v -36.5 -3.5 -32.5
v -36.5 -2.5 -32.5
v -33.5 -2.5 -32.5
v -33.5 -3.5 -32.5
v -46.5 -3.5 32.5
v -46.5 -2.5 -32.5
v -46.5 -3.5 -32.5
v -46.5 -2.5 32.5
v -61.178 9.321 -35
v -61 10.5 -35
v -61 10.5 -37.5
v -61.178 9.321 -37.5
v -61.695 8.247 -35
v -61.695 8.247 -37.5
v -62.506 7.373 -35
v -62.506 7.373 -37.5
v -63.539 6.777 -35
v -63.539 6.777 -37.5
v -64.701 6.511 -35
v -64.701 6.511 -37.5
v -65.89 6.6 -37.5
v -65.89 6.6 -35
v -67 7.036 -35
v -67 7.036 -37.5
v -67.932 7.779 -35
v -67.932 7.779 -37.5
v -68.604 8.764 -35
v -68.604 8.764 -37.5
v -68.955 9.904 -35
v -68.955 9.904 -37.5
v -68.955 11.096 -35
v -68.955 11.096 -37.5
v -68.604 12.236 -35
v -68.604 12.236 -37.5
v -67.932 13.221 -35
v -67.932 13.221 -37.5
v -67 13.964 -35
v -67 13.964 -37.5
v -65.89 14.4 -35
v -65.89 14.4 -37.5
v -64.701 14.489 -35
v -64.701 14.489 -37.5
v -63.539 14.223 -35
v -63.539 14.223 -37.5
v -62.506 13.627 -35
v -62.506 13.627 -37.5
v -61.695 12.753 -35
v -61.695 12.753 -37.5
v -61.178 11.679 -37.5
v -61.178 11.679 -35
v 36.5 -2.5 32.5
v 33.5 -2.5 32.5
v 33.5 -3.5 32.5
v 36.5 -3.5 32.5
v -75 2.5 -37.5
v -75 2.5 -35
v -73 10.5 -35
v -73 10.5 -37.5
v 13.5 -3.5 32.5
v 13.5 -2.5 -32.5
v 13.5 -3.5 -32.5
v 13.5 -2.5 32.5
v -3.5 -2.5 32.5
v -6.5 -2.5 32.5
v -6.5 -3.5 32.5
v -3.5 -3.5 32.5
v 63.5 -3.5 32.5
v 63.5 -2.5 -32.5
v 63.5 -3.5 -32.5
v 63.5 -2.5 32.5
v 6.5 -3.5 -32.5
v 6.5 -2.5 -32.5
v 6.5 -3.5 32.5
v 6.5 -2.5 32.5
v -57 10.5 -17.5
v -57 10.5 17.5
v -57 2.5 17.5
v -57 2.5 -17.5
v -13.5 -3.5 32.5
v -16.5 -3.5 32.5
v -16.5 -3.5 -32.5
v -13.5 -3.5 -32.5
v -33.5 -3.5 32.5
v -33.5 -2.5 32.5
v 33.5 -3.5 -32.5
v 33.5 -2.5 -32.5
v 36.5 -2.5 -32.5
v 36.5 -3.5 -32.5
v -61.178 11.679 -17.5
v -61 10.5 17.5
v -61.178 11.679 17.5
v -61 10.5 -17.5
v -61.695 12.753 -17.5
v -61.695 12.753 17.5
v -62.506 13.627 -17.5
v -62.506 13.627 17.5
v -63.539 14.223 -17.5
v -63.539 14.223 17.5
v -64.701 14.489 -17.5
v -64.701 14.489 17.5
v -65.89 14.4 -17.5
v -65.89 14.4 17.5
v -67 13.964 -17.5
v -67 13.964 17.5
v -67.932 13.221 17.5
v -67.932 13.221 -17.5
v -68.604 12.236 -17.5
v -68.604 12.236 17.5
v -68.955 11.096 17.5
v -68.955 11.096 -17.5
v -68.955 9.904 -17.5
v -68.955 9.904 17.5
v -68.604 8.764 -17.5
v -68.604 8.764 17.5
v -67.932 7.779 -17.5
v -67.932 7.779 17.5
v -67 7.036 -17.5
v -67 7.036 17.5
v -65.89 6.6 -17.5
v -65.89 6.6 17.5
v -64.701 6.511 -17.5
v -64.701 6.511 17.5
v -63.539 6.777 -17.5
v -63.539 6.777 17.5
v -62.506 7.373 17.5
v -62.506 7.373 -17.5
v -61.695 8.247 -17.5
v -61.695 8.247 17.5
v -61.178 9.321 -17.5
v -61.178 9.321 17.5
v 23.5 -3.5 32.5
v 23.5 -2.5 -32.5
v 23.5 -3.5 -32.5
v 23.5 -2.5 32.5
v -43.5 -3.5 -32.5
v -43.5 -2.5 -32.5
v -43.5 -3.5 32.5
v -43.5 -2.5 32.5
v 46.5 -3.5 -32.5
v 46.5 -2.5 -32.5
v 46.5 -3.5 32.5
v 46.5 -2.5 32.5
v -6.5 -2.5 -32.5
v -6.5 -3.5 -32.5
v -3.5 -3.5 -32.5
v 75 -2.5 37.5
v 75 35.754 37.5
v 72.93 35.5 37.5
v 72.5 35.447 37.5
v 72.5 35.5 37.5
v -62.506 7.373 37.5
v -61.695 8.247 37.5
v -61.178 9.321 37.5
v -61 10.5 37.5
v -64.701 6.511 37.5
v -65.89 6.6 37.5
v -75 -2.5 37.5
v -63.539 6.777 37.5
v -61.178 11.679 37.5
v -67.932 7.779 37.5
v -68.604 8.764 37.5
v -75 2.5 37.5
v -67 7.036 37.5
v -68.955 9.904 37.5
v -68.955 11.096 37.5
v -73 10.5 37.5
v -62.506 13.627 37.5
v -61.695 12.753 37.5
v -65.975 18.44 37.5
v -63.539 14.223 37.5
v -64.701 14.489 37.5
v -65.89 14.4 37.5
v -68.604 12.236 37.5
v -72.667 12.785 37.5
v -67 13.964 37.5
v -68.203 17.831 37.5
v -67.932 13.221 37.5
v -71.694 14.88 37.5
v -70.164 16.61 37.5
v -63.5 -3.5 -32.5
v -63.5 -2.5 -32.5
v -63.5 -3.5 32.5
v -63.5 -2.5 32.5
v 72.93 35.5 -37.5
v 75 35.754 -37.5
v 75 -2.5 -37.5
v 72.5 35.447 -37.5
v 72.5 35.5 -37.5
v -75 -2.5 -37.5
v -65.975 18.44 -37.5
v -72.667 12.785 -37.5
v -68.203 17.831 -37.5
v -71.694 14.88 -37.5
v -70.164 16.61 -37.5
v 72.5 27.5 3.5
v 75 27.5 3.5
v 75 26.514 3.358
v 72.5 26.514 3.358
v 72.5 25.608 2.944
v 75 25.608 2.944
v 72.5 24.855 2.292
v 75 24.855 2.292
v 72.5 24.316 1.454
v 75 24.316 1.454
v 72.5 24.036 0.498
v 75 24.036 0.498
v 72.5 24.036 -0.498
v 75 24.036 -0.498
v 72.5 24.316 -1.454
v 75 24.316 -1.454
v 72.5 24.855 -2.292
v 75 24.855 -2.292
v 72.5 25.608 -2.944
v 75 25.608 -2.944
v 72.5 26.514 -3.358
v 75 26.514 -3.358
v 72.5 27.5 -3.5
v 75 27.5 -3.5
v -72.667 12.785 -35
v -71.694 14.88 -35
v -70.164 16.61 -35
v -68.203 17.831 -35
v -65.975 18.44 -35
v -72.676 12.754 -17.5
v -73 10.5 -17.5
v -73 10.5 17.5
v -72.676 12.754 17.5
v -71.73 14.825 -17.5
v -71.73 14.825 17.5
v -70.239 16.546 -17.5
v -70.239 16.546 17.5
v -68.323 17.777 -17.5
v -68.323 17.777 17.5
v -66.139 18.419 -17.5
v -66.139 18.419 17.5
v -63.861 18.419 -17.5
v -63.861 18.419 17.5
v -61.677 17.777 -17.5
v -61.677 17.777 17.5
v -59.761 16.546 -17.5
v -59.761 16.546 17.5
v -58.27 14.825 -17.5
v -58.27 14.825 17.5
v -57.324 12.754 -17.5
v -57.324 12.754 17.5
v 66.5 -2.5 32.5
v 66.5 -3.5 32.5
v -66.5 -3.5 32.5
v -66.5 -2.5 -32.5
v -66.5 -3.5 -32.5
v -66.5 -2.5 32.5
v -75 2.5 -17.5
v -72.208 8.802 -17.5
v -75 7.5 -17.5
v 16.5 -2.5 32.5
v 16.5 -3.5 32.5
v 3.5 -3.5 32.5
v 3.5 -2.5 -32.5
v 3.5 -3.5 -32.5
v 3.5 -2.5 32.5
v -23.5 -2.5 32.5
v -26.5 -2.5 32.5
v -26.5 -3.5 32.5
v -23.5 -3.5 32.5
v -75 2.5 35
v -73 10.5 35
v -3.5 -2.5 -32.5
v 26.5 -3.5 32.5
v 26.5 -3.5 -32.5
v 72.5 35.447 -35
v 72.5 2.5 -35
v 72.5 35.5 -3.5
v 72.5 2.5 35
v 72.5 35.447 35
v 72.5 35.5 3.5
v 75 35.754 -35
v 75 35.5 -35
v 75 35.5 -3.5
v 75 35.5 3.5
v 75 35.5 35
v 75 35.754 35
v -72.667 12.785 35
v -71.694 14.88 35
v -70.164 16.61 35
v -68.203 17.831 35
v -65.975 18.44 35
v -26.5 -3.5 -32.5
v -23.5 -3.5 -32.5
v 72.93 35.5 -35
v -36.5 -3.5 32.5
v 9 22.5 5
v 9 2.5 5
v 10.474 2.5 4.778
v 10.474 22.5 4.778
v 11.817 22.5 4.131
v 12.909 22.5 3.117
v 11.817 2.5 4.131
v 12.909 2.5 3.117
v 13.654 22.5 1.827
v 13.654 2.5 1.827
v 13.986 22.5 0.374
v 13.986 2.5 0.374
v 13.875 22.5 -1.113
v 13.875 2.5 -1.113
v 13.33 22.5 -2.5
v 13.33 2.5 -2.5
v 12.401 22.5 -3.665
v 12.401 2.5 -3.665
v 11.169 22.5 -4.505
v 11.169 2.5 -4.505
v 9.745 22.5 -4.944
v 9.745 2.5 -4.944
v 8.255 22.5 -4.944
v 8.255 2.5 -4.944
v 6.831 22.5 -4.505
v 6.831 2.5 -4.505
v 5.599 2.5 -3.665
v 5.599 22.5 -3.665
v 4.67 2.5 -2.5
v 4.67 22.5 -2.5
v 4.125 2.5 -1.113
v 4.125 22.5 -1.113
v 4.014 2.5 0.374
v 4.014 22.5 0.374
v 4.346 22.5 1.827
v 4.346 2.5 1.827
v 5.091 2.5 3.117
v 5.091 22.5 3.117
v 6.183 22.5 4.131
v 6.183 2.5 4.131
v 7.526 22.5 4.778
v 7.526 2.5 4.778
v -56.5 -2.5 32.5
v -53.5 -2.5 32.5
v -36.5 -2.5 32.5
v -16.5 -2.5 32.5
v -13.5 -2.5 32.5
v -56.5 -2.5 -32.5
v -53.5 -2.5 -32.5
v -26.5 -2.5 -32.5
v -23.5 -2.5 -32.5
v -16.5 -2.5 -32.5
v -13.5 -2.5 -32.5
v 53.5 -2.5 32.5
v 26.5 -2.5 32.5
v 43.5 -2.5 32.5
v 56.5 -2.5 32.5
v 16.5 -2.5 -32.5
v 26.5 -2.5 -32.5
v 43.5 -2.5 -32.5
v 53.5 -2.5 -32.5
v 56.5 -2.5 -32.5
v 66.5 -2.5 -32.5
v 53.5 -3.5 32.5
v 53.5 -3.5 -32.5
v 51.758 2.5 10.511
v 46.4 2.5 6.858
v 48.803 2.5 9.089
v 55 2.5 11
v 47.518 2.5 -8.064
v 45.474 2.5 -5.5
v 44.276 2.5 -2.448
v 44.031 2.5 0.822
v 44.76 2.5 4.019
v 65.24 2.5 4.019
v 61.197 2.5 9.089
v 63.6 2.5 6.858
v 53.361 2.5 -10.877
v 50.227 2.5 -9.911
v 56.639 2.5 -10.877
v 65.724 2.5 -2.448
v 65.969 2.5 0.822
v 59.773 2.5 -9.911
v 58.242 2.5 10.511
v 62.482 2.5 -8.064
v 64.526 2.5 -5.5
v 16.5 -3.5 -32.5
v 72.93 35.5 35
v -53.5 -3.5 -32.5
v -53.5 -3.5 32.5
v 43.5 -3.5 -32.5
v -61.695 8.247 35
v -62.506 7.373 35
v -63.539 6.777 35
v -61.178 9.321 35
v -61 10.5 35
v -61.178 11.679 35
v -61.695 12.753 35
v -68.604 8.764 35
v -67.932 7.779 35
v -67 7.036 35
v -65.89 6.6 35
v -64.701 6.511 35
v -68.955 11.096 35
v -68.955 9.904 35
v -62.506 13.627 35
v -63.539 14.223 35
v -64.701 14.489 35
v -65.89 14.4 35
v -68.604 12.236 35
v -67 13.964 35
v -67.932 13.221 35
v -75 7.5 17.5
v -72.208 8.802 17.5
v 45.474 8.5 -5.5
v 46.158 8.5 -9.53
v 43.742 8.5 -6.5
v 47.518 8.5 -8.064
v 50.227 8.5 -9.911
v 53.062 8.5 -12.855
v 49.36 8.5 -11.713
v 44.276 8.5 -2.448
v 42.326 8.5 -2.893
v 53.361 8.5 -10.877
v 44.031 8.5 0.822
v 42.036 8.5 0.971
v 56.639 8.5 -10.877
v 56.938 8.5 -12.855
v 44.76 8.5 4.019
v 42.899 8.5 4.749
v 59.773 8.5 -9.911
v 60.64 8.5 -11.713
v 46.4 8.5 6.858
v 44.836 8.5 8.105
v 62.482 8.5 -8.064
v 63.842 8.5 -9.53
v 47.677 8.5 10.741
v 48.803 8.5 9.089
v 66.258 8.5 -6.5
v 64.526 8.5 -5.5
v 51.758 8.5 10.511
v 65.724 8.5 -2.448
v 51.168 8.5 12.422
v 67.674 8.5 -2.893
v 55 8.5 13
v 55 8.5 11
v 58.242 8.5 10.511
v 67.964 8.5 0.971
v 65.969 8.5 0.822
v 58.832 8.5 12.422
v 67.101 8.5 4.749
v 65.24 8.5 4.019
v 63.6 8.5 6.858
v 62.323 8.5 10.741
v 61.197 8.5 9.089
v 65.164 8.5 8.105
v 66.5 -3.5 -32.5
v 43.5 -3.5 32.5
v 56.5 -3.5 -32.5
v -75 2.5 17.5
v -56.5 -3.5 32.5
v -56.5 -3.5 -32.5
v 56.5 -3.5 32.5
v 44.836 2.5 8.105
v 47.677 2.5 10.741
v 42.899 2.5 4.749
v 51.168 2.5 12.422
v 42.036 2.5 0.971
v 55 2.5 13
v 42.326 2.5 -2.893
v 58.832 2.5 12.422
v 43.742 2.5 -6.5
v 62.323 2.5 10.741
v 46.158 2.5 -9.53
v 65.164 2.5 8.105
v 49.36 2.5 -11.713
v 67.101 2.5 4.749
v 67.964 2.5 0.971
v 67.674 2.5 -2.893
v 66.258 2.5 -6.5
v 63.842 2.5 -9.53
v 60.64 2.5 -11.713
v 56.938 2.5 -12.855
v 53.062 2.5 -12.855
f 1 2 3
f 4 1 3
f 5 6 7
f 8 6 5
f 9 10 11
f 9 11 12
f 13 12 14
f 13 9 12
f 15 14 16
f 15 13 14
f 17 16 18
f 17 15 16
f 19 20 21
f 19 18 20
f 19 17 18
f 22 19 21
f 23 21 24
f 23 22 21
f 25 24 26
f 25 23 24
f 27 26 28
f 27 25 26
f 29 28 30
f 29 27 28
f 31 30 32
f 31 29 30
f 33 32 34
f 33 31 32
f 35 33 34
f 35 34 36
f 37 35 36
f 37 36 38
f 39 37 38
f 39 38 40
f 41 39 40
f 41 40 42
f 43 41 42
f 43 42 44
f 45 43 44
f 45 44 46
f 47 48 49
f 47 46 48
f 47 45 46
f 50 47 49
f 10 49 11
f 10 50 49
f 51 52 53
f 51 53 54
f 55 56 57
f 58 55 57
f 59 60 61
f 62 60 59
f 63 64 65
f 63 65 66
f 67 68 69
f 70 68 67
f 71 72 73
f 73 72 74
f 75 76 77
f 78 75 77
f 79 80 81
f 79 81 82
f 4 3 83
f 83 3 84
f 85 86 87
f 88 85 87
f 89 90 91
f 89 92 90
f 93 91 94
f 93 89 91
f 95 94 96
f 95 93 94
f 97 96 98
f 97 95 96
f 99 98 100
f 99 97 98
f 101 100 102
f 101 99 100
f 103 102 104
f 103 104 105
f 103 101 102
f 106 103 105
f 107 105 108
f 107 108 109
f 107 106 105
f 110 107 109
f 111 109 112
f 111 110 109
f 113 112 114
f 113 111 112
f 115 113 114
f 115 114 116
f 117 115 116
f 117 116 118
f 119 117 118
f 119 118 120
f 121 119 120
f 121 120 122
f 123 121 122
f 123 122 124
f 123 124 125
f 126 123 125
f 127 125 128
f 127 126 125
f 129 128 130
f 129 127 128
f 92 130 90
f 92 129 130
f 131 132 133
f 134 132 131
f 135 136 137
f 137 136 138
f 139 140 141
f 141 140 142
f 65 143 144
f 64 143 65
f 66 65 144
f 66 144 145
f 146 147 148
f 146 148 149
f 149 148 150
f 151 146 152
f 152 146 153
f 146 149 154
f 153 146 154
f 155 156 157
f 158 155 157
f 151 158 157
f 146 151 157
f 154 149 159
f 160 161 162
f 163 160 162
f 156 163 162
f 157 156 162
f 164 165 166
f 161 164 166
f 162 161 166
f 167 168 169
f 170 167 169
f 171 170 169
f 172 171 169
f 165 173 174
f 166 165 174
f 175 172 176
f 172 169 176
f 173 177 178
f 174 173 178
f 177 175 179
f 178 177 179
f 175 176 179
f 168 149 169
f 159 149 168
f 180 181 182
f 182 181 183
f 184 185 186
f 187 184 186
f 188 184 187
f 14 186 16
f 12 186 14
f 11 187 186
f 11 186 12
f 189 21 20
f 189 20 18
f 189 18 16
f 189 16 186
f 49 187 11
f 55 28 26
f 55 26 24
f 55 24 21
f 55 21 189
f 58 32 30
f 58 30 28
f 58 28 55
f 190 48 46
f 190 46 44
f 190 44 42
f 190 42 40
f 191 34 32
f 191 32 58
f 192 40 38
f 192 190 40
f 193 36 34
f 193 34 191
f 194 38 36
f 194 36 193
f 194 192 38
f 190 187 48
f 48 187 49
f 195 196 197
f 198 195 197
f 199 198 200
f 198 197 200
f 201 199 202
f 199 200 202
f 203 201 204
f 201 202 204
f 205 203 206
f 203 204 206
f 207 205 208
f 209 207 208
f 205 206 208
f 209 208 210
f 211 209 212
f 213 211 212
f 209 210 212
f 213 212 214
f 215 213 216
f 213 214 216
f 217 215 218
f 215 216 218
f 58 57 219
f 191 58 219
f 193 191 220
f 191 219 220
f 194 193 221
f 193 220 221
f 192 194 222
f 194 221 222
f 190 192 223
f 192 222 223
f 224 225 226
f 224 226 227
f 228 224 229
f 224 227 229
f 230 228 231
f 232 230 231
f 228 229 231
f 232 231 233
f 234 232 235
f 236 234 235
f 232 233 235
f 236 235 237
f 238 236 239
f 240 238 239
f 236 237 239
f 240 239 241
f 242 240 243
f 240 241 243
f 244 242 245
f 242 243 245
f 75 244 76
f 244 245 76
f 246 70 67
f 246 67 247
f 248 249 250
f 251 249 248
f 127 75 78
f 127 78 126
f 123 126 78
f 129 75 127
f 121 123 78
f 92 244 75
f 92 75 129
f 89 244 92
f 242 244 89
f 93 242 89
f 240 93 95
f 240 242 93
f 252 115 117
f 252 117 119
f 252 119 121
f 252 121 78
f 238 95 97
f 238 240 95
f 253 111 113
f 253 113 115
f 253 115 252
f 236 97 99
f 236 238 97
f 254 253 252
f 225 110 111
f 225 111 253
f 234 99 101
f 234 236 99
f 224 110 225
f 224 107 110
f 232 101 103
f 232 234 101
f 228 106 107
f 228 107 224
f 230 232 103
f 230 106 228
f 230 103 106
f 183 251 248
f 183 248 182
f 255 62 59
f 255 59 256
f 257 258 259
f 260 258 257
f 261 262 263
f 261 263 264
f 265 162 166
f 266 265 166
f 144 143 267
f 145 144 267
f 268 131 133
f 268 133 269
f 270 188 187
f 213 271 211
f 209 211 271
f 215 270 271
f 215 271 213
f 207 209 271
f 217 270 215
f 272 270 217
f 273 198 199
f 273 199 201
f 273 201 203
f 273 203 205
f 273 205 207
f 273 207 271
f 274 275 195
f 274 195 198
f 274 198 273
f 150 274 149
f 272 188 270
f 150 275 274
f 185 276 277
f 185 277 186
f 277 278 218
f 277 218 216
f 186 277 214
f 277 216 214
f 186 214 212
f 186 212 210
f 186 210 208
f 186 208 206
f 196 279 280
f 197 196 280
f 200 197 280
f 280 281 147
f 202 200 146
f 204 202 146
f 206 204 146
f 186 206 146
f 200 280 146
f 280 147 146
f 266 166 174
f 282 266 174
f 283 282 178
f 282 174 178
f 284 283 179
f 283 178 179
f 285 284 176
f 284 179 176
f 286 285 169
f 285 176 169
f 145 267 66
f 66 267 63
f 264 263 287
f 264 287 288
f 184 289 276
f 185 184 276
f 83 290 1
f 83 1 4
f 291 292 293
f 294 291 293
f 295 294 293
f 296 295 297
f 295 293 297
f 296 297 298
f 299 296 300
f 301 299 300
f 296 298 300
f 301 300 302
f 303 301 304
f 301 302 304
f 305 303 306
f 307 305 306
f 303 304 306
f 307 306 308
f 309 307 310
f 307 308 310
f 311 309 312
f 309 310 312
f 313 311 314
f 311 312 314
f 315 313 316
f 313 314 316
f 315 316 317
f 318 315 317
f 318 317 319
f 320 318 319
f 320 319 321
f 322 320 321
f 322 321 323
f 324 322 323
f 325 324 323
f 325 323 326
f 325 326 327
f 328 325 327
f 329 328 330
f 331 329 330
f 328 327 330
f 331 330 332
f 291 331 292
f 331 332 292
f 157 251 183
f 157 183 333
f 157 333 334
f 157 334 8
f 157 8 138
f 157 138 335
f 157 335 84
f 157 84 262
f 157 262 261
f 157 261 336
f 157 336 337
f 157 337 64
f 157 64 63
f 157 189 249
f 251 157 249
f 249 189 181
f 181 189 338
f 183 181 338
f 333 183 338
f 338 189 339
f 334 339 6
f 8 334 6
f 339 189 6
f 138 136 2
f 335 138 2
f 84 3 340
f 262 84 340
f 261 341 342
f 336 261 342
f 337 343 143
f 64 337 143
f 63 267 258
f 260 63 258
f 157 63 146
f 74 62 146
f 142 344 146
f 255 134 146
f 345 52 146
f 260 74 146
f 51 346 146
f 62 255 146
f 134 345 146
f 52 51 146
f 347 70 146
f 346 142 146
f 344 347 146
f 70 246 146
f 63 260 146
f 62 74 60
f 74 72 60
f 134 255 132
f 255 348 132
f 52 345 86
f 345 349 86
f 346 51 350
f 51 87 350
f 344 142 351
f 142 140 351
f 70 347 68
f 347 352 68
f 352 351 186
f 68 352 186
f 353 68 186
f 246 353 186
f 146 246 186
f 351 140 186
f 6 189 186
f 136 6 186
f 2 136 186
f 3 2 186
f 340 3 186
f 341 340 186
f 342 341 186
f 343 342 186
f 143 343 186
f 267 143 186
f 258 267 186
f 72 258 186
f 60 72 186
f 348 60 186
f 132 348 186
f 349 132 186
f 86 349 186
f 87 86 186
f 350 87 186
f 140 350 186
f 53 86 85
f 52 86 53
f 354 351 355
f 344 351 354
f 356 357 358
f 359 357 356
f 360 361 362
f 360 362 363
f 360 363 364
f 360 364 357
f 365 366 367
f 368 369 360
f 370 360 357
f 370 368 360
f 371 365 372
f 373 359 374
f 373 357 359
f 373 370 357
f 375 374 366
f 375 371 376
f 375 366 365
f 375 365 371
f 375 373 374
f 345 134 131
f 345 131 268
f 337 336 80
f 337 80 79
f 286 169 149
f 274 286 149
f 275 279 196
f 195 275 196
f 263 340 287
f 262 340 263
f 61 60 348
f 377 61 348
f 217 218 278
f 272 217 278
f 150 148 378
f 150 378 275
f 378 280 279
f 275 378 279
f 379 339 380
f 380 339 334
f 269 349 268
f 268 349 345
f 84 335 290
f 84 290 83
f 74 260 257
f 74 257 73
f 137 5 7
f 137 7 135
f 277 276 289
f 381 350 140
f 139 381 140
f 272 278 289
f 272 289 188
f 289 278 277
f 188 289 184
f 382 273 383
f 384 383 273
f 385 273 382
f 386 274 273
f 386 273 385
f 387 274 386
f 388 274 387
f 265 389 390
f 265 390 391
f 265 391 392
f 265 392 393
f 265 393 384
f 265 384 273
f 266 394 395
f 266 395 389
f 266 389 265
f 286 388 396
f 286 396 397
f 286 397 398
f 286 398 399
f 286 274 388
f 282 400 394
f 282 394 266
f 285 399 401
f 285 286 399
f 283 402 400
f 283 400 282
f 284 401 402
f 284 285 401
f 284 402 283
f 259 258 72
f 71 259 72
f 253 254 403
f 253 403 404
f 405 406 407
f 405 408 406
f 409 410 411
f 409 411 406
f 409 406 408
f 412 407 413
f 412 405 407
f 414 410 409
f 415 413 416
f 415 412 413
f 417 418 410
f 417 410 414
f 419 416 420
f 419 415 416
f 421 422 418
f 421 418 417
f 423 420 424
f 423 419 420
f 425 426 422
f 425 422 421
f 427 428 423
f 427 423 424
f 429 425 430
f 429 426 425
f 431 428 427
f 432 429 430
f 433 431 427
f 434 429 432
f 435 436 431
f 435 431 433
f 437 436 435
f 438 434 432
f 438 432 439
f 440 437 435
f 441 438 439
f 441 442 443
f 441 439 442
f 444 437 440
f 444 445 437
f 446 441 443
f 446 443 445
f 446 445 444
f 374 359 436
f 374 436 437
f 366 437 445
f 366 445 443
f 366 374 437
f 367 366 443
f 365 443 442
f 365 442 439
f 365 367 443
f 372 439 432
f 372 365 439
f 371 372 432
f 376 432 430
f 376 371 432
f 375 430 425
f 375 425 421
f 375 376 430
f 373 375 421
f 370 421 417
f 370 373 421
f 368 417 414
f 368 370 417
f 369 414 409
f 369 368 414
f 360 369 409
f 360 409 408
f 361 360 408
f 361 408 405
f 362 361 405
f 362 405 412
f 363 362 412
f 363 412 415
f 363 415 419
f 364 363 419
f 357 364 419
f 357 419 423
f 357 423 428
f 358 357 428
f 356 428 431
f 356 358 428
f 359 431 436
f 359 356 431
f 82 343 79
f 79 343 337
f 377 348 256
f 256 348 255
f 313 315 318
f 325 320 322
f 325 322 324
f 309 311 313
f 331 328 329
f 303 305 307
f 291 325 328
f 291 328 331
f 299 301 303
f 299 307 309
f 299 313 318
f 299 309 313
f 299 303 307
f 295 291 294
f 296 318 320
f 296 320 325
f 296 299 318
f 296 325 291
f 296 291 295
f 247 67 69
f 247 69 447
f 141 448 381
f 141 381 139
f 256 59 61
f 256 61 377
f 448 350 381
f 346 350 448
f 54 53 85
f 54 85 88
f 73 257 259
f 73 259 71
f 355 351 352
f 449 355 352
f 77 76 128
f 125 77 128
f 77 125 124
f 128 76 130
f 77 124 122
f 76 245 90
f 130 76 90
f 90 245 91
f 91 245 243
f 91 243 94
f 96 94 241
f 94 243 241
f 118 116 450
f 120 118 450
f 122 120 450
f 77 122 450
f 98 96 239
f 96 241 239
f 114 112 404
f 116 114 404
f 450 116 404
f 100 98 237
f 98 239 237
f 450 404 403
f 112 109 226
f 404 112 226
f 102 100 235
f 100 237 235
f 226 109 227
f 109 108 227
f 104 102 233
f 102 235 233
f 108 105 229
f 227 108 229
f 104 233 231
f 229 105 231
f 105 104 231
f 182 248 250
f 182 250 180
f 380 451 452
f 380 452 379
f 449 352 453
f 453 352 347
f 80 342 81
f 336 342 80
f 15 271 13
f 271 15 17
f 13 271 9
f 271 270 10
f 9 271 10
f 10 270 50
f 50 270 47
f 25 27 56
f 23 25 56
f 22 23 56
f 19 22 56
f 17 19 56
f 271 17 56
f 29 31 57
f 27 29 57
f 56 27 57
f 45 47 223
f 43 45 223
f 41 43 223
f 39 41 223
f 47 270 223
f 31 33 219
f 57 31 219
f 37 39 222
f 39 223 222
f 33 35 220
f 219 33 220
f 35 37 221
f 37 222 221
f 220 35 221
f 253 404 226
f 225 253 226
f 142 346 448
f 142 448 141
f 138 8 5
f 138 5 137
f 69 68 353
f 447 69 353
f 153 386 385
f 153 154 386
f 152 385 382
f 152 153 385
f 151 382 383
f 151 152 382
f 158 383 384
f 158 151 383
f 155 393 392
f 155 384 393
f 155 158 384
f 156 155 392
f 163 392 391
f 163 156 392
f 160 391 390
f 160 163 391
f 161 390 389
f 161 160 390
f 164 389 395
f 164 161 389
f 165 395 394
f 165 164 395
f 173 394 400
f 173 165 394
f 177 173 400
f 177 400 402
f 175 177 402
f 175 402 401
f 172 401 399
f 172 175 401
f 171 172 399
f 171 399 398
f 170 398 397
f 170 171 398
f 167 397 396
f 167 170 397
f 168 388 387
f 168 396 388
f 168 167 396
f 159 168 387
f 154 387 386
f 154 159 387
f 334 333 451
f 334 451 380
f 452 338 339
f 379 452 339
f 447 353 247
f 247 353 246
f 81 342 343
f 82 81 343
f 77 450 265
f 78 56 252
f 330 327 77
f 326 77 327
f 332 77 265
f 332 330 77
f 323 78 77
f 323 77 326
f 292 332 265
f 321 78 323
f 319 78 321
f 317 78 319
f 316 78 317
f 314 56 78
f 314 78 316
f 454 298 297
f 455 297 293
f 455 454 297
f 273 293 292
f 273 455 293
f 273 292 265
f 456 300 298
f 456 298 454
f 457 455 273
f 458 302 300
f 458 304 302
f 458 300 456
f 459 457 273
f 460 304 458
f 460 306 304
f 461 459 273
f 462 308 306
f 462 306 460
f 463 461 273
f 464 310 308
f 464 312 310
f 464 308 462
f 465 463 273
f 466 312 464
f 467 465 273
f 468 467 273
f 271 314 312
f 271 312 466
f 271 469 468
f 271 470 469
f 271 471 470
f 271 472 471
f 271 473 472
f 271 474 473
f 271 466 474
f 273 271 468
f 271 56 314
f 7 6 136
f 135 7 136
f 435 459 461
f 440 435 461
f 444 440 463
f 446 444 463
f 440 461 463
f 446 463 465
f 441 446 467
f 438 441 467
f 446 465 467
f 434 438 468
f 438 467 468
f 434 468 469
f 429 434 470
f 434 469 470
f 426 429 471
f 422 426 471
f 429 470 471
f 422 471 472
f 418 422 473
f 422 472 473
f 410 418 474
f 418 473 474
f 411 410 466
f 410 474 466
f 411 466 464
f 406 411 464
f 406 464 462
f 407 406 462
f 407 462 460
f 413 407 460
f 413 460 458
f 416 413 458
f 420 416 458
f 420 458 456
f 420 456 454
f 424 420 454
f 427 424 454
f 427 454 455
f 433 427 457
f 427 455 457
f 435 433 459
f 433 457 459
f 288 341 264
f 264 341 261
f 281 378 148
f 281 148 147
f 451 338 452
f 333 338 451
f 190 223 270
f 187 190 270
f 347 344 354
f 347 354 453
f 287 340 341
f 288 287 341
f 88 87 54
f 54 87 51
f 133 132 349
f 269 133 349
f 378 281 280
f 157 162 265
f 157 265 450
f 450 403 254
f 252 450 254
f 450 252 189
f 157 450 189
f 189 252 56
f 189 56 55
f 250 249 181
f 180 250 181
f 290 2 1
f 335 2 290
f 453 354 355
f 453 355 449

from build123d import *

# Parameters (mm, degrees)
SKETCH2_W               = 150
SKETCH2_H               = 75
BOSS_EXTRUDE1_DEPTH     = 2.5
SKETCH3_R               = 4
BOSS_EXTRUDE2_DEPTH     = 17.5
SKETCH4_R               = 5
BOSS_EXTRUDE3_DEPTH     = 20
SKETCH7_R               = 13
SKETCH7_R_2             = 11
BOSS_EXTRUDE4_DEPTH     = 6
BOSS_EXTRUDE5_START     = 37.5
BOSS_EXTRUDE5_DEPTH     = 2.5
BOSS_EXTRUDE6_START     = -35
BOSS_EXTRUDE6_DEPTH     = 2.5
BOSS_EXTRUDE7_DEPTH     = 2.5
SKETCH11_W              = 3
SKETCH11_H              = 65
BOSS_EXTRUDE8_DEPTH     = 1
CUT_EXTRUDE1_DEPTH      = 112.930169188
CUT_EXTRUDE1_DEPTH_BACK = 112.930169188
SKETCH12_R              = 4


with BuildPart() as part:
    # Sketch2 → Boss-Extrude1 (new, symmetric)
    with BuildSketch(Plane(origin=(0, 0, 0), x_dir=(1, 0, 0), z_dir=(0, 1, 0))):
        Rectangle(SKETCH2_W, SKETCH2_H)
    extrude(amount=BOSS_EXTRUDE1_DEPTH, both=True)

    # Sketch3 → Boss-Extrude2 (add, symmetric)
    with BuildSketch(Plane.XY):
        with BuildLine():
            Line((-57, 10.5), (-57, 2.5))
            Line((-57, 2.5), (-75, 2.5))
            Line((-75, 2.5), (-75, 7.5))
            Line((-75, 7.5), (-72.208145726, 8.801863029))
            Line((-72.208145726, 8.801863029), (-73, 10.5))
            ThreePointArc((-73, 10.5), (-65, 18.5), (-57, 10.5))
        make_face()
        with Locations((-65, 10.5)):
            Circle(SKETCH3_R, mode=Mode.SUBTRACT)
    extrude(amount=BOSS_EXTRUDE2_DEPTH, both=True)

    # Sketch4 → Boss-Extrude3 (add)
    with BuildSketch(Plane(origin=(0, 2.5, 0), x_dir=(1, 0, 0), z_dir=(0, 1, 0))):
        with Locations(Location((9, 0, 0), (0, 0, 270))):
            Circle(SKETCH4_R)
    extrude(amount=BOSS_EXTRUDE3_DEPTH)

    # Sketch7 → Boss-Extrude4 (add)
    with BuildSketch(Plane(origin=(0, 2.5, 0), x_dir=(1, 0, 0), z_dir=(0, 1, 0))):
        with Locations(Location((55, 0, 0), (0, 0, 270))):
            Circle(SKETCH7_R)
        with Locations(Location((55, 0, 0), (0, 0, 270))):
            Circle(SKETCH7_R_2, mode=Mode.SUBTRACT)
    extrude(amount=BOSS_EXTRUDE4_DEPTH)

    # Sketch9 → Boss-Extrude5 (add)
    with BuildSketch(Plane.XY.offset(BOSS_EXTRUDE5_START)):
        with BuildLine():
            Line((75, 35.754199396), (75, 2.5))
            Line((75, 2.5), (-75, 2.5))
            Line((-75, 2.5), (-73, 10.5))
            ThreePointArc((-73, 10.5), (-70.991725081, 15.800870736), (-65.975192361, 18.440340034))
            Line((-65.975192361, 18.440340034), (75, 35.754199396))
        make_face()
    extrude(amount=-BOSS_EXTRUDE5_DEPTH)

    # Sketch9<2> → Boss-Extrude6 (add)
    with BuildSketch(Plane.XY.offset(BOSS_EXTRUDE6_START)):
        with BuildLine():
            Line((75, 35.754199396), (75, 2.5))
            Line((75, 2.5), (-75, 2.5))
            Line((-75, 2.5), (-73, 10.5))
            ThreePointArc((-73, 10.5), (-70.991725081, 15.800870736), (-65.975192361, 18.440340034))
            Line((-65.975192361, 18.440340034), (75, 35.754199396))
        make_face()
    extrude(amount=-BOSS_EXTRUDE6_DEPTH)

    # Sketch10 → Boss-Extrude7 (add)
    with BuildSketch(Plane(origin=(75, 0, 0), x_dir=(0, 0, -1), z_dir=(1, 0, 0))):
        with BuildLine():
            Line((37.5, 35.5), (37.5, -2.5))
            Line((37.5, -2.5), (-37.5, -2.5))
            Line((-37.5, -2.5), (-37.5, 35.5))
            Line((-37.5, 35.5), (-3.5, 35.5))
            Line((-3.5, 35.5), (-3.5, 27.5))
            ThreePointArc((-3.5, 27.5), (0, 24), (3.5, 27.5))
            Line((3.5, 27.5), (3.5, 35.5))
            Line((3.5, 35.5), (37.5, 35.5))
        make_face()
    extrude(amount=-BOSS_EXTRUDE7_DEPTH)

    # Sketch11 → Boss-Extrude8 (add)
    with BuildSketch(Plane.XZ.offset(2.5)):
        with Locations((-45, 0)):
            Rectangle(SKETCH11_W, SKETCH11_H)
        with Locations((-35, 0)):
            Rectangle(SKETCH11_W, SKETCH11_H)
        with Locations((-25, 0)):
            Rectangle(SKETCH11_W, SKETCH11_H)
        with Locations((-15, 0)):
            Rectangle(SKETCH11_W, SKETCH11_H)
        with Locations((-5, 0)):
            Rectangle(SKETCH11_W, SKETCH11_H)
        with Locations((5, 0)):
            Rectangle(SKETCH11_W, SKETCH11_H)
        with Locations((15, 0)):
            Rectangle(SKETCH11_W, SKETCH11_H)
        with Locations((25, 0)):
            Rectangle(SKETCH11_W, SKETCH11_H)
        with Locations((35, 0)):
            Rectangle(SKETCH11_W, SKETCH11_H)
        with Locations((45, 0)):
            Rectangle(SKETCH11_W, SKETCH11_H)
        with Locations((55, 0)):
            Rectangle(SKETCH11_W, SKETCH11_H)
        with Locations((65, 0)):
            Rectangle(SKETCH11_W, SKETCH11_H)
        with Locations((-65, 0)):
            Rectangle(SKETCH11_W, SKETCH11_H)
        with Locations((-55, 0)):
            Rectangle(SKETCH11_W, SKETCH11_H)
    extrude(amount=BOSS_EXTRUDE8_DEPTH)

    # Sketch12 → Cut-Extrude1 (cut, two sides: drawn at the far end of the back side and taken through both)
    with BuildSketch(Plane(origin=(0, 0, -37.5), x_dir=(-1, 0, 0), z_dir=(0, 0, -1)).offset(-CUT_EXTRUDE1_DEPTH_BACK)):
        with Locations(Location((65, 10.5, 0), (0, 0, 180))):
            Circle(SKETCH12_R)
    extrude(amount=CUT_EXTRUDE1_DEPTH + CUT_EXTRUDE1_DEPTH_BACK, mode=Mode.SUBTRACT)


solid = part.part
